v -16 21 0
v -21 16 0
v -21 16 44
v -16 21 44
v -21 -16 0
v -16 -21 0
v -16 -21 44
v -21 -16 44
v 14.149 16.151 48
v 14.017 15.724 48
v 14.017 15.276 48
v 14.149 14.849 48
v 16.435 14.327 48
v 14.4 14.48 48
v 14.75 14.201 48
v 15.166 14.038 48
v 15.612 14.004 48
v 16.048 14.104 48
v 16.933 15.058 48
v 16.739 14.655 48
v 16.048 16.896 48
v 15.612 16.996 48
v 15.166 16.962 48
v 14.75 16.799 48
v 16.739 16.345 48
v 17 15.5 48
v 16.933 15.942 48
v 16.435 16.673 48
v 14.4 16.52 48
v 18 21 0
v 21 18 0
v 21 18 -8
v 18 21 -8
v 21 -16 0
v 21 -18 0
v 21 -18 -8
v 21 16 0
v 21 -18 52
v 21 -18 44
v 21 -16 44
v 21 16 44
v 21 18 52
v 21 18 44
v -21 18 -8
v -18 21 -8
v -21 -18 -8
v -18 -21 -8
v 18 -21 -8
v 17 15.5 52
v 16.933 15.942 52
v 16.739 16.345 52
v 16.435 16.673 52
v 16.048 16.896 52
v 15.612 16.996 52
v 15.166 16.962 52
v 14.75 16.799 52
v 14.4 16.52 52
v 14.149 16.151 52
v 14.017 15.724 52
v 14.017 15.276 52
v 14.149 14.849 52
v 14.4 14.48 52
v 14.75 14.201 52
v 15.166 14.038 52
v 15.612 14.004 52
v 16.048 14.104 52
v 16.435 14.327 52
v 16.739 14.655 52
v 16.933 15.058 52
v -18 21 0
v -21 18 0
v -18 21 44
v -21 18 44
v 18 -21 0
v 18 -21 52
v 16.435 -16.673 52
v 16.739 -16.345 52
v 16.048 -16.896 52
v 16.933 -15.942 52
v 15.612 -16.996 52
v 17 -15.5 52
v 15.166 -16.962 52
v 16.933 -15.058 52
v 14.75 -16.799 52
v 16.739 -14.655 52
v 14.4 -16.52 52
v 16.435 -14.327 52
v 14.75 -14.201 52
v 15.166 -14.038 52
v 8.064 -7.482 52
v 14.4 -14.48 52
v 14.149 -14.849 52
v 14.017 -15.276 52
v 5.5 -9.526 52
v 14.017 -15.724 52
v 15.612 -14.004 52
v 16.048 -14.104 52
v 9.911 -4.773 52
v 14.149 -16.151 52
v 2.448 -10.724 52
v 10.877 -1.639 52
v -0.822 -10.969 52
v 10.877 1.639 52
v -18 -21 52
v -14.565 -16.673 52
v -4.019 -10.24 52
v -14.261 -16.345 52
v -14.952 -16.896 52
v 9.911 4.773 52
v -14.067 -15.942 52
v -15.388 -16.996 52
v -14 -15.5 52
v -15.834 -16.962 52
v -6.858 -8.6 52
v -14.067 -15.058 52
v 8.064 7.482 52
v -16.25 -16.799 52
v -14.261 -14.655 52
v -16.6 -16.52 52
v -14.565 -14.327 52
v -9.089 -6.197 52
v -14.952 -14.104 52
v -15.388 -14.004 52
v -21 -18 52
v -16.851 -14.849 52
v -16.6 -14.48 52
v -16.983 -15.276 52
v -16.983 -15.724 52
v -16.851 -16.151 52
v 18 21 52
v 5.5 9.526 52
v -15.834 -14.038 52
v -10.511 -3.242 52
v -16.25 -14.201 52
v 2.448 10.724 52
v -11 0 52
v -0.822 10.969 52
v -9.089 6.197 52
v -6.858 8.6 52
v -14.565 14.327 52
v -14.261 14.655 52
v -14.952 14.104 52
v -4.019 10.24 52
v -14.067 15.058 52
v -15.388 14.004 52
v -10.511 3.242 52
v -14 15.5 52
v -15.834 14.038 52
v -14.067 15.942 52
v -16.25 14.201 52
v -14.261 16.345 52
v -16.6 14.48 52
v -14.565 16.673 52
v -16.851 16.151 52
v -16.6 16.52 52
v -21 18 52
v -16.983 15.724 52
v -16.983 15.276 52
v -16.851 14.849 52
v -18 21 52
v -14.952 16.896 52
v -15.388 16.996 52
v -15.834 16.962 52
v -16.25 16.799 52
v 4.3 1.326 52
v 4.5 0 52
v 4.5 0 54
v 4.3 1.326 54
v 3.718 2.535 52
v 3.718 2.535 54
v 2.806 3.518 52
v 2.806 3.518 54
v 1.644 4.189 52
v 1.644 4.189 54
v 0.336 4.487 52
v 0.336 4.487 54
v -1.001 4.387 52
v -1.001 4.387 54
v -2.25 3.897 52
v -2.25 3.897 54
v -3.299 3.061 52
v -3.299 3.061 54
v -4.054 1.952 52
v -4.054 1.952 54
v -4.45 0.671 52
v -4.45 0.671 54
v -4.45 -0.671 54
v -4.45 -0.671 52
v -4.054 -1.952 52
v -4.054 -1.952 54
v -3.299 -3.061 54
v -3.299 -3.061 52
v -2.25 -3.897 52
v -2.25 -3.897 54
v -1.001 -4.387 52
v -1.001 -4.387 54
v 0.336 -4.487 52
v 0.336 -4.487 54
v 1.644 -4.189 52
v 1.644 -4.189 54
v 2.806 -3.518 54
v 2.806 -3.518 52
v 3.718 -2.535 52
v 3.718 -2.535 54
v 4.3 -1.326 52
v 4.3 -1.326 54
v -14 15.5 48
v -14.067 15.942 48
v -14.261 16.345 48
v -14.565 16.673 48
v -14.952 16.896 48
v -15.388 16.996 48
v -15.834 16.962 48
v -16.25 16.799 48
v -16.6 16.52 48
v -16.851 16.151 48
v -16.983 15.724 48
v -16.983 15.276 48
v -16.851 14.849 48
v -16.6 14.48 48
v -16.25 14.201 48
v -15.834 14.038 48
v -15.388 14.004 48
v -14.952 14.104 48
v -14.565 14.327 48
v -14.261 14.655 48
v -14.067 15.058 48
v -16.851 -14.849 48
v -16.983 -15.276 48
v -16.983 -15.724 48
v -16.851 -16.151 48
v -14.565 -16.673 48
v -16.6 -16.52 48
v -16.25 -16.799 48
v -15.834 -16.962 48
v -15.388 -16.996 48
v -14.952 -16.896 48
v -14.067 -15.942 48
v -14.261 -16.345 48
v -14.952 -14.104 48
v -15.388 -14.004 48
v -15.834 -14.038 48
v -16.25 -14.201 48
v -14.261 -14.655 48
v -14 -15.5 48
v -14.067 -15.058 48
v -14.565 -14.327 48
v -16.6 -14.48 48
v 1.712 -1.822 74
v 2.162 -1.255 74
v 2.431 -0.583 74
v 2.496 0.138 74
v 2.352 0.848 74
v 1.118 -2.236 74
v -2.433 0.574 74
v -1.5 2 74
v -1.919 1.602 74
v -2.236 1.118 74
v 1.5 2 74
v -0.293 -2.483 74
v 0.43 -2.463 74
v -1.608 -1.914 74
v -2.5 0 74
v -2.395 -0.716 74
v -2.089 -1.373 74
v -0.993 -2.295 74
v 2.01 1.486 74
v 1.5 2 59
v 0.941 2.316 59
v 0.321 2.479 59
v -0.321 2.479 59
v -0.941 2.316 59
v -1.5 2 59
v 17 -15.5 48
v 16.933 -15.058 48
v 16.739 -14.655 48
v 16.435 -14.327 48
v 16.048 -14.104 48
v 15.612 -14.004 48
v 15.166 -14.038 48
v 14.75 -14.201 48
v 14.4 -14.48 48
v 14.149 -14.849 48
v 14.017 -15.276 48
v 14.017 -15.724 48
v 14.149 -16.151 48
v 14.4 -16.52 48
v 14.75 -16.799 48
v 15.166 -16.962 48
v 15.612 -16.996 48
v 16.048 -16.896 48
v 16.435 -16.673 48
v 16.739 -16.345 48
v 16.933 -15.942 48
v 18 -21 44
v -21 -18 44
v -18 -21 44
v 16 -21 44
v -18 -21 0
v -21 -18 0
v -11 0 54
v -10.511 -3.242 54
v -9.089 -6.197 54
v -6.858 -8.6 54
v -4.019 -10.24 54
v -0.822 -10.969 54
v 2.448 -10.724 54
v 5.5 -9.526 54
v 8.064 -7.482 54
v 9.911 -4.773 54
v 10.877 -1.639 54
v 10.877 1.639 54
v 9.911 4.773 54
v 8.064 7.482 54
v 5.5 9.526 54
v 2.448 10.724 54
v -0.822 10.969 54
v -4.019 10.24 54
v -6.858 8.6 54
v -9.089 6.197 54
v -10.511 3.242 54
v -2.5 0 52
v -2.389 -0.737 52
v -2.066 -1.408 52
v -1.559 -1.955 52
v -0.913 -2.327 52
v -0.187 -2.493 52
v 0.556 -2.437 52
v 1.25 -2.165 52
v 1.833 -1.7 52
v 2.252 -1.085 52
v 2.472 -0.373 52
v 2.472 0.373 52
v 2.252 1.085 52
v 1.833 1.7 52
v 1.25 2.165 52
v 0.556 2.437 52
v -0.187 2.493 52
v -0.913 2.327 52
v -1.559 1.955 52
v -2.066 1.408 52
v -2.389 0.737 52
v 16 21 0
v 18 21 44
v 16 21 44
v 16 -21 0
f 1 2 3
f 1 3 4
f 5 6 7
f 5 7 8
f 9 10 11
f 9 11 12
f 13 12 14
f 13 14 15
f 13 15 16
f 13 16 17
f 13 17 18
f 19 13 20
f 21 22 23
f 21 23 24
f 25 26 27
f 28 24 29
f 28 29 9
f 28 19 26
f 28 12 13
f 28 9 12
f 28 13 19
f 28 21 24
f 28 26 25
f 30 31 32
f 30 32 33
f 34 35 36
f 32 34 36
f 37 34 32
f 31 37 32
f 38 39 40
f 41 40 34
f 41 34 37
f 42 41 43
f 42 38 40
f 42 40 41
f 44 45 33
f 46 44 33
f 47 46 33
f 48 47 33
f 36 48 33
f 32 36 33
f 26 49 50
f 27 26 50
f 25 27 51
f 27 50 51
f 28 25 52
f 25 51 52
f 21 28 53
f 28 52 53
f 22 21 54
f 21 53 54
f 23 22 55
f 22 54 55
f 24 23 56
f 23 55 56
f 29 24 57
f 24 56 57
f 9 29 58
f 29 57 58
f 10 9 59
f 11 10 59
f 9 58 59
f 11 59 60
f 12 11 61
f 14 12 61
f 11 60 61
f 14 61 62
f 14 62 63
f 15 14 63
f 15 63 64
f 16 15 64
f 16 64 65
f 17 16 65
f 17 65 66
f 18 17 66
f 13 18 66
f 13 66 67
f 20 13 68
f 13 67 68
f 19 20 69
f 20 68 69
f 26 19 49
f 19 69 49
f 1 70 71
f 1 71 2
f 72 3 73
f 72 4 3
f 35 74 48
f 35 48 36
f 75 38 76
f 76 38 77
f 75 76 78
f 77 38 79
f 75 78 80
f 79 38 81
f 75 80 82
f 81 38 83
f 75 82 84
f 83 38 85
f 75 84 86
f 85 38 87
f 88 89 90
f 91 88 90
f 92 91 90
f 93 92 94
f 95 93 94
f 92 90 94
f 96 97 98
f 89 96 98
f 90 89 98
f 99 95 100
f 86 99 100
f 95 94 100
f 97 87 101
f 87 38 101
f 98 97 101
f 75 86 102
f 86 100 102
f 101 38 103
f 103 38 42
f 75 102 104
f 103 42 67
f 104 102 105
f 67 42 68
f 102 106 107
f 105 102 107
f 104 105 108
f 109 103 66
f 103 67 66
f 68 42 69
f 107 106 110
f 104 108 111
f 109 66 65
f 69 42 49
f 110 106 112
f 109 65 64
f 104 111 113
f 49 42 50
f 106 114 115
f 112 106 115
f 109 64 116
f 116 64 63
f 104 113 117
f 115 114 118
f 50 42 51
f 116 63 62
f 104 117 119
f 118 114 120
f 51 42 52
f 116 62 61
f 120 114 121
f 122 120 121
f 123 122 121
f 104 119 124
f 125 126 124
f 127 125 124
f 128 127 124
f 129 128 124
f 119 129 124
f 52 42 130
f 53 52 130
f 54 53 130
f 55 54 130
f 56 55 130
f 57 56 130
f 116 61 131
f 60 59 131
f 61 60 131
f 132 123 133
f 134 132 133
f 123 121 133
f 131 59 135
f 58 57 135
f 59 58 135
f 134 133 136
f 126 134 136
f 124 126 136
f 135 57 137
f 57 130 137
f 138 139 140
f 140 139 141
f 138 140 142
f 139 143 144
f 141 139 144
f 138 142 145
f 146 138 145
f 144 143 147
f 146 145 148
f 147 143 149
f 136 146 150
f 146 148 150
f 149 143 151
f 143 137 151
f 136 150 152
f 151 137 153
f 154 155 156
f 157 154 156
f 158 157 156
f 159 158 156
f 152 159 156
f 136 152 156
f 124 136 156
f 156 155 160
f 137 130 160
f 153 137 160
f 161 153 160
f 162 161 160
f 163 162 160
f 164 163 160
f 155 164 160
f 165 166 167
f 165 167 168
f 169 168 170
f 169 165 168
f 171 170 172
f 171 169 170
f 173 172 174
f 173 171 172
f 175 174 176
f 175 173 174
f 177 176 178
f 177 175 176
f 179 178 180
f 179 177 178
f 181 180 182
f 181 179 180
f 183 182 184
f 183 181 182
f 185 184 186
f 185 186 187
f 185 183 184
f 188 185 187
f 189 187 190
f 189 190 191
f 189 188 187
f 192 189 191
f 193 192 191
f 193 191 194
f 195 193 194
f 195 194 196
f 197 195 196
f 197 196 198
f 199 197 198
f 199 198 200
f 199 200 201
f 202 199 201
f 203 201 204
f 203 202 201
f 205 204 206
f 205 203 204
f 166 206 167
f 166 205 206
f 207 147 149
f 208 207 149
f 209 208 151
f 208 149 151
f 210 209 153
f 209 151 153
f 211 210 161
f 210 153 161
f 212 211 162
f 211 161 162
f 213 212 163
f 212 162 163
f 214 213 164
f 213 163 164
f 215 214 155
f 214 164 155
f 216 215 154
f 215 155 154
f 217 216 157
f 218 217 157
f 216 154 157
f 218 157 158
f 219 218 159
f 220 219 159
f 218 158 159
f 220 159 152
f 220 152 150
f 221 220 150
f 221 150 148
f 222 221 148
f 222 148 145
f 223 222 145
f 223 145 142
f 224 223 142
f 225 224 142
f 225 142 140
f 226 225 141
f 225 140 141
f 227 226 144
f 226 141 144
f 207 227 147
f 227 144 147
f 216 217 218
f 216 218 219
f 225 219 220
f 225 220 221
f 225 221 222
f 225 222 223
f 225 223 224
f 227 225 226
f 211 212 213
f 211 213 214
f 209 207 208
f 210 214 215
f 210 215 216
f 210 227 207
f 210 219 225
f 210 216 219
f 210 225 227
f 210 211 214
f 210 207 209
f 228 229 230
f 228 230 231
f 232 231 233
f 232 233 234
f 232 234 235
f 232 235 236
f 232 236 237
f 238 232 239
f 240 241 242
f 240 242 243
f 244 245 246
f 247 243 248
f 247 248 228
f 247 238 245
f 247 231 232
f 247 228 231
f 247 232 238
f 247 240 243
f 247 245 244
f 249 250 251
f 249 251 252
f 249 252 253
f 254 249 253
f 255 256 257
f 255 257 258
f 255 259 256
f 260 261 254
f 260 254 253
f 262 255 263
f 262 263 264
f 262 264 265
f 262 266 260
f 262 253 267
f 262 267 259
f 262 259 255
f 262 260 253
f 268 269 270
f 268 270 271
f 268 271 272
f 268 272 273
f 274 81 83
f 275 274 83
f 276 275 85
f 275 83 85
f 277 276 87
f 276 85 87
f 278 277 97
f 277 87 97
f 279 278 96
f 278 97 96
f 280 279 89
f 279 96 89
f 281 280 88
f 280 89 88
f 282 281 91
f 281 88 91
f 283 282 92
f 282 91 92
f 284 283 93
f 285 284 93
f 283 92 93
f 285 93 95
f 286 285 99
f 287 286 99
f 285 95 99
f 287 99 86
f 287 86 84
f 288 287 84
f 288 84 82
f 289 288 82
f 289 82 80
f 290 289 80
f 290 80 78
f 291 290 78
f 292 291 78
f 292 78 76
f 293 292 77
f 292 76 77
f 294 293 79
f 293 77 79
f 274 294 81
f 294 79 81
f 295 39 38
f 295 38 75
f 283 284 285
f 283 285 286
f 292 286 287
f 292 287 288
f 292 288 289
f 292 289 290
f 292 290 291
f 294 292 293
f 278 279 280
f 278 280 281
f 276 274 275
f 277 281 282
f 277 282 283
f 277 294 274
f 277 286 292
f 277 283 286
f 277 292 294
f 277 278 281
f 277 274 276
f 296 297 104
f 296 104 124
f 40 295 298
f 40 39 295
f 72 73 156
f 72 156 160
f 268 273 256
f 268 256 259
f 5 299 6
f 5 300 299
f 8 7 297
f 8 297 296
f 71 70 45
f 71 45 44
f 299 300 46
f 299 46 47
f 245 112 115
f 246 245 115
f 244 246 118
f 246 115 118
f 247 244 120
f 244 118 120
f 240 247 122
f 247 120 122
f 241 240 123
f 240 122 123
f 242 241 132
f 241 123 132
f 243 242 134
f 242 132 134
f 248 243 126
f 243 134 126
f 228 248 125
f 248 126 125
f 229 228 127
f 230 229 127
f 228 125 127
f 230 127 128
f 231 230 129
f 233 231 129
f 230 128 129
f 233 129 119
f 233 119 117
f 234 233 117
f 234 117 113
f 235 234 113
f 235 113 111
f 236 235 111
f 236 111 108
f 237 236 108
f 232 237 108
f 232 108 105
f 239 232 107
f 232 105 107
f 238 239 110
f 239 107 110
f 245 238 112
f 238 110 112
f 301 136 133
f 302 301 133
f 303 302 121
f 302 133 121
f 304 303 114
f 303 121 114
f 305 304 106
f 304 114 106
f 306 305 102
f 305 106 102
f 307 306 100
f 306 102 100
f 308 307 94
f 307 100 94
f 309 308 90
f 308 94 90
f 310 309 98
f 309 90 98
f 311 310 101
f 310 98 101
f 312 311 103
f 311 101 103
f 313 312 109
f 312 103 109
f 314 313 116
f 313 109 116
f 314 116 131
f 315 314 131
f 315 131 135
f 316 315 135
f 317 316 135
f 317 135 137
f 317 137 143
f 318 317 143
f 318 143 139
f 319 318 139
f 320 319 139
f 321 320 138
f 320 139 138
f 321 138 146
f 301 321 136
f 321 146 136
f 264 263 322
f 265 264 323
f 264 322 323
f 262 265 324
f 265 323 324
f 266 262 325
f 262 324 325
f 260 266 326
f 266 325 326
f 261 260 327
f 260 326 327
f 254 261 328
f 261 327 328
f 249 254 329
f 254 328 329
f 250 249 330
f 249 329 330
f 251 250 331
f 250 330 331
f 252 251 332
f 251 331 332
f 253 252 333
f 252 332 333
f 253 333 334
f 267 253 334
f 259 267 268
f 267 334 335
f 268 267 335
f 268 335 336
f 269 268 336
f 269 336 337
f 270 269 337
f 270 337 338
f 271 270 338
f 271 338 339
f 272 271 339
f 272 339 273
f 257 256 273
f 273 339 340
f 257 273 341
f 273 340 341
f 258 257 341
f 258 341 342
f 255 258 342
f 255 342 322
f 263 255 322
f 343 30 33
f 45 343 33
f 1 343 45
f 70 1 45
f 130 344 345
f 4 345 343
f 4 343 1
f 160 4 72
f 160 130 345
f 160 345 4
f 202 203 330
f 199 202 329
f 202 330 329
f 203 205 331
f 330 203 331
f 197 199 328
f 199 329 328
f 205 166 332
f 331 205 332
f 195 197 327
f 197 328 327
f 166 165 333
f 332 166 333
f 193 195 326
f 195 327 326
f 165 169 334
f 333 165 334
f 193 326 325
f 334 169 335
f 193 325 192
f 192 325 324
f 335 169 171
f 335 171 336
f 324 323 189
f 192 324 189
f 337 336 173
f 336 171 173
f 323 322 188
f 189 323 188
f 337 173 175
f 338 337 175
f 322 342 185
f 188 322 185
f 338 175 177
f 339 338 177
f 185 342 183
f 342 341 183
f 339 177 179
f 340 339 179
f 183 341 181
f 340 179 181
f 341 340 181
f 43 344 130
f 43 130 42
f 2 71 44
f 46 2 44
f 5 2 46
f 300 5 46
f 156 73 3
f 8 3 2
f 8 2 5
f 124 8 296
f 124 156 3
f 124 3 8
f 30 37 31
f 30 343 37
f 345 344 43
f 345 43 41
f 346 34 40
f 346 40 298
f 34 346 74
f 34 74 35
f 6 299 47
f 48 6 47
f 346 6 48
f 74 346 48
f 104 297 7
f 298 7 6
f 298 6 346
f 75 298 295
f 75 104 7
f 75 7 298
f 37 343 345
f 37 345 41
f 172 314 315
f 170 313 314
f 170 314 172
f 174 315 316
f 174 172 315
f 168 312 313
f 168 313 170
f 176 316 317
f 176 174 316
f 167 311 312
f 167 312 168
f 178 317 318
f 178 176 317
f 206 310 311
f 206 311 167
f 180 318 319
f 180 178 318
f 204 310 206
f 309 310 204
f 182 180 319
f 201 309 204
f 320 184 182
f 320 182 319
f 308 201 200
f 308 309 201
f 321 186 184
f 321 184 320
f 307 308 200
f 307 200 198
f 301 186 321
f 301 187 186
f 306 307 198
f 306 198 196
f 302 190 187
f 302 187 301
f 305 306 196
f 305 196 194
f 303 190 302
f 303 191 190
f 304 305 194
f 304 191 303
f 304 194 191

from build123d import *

# Parameters (mm, degrees)
SALIENTE_EXTRUIR1_DEPTH = 44
SALIENTE_EXTRUIR2_DEPTH = 8
SALIENTE_EXTRUIR3_DEPTH = 8
CROQUIS4_R              = 11
CROQUIS4_R_2            = 4.5
SALIENTE_EXTRUIR4_DEPTH = 2
CROQUIS5_R              = 2.5
SALIENTE_EXTRUIR5_DEPTH = 22
CORTAR_EXTRUIR1_START   = -15
CORTAR_EXTRUIR1_DEPTH   = 15
CROQUIS7_R              = 1.5
CORTAR_EXTRUIR2_DEPTH   = 4


with BuildPart() as part:
    # Croquis1 → Saliente-Extruir1 (new body)
    with BuildSketch(Plane.XY):
        Polygon((-21, 16), (-16, 21), (16, 21), (21, 16), (21, -16), (16, -21), (-16, -21), (-21, -16), align=None)
    extrude(amount=SALIENTE_EXTRUIR1_DEPTH)

    # Croquis2 → Saliente-Extruir2 (add)
    with BuildSketch(Plane.XY.offset(44)):
        Polygon((-21, 18), (-18, 21), (18, 21), (21, 18), (21, -18), (18, -21), (-18, -21), (-21, -18), align=None)
    extrude(amount=SALIENTE_EXTRUIR2_DEPTH)

    # Croquis3 → Saliente-Extruir3 (add)
    with BuildSketch(Plane(origin=(0, 0, 0), x_dir=(-1, 0, 0), z_dir=(0, 0, -1))):
        Polygon((-21, 18), (-18, 21), (18, 21), (21, 18), (21, -18), (18, -21), (-18, -21), (-21, -18), align=None)
    extrude(amount=SALIENTE_EXTRUIR3_DEPTH)

    # Croquis4 → Saliente-Extruir4 (add)
    with BuildSketch(Plane.XY.offset(52)):
        with Locations(Location((0, 0, 0), (0, 0, 180))):
            Circle(CROQUIS4_R)
        Circle(CROQUIS4_R_2, mode=Mode.SUBTRACT)
    extrude(amount=SALIENTE_EXTRUIR4_DEPTH)

    # Croquis5 → Saliente-Extruir5 (add)
    with BuildSketch(Plane.XY.offset(52)):
        with Locations(Location((0, 0, 0), (0, 0, 180))):
            Circle(CROQUIS5_R)
    extrude(amount=SALIENTE_EXTRUIR5_DEPTH)

    # Croquis6 → Cortar-Extruir1 (cut)
    with BuildSketch(Plane.XY.offset(74).offset(CORTAR_EXTRUIR1_START)):
        with BuildLine():
            Line((-1.5, 2), (1.5, 2))
            ThreePointArc((1.5, 2), (0, 2.5), (-1.5, 2))
        make_face()
    extrude(amount=CORTAR_EXTRUIR1_DEPTH, mode=Mode.SUBTRACT)

    # Croquis7 → Cortar-Extruir2 (cut)
    with BuildSketch(Plane.XY.offset(52)):
        with Locations((-15.5, 15.5)):
            Circle(CROQUIS7_R)
        with Locations((15.5, 15.5)):
            Circle(CROQUIS7_R)
        with Locations((15.5, -15.5)):
            Circle(CROQUIS7_R)
        with Locations((-15.5, -15.5)):
            Circle(CROQUIS7_R)
    extrude(amount=-CORTAR_EXTRUIR2_DEPTH, mode=Mode.SUBTRACT)


solid = part.part
